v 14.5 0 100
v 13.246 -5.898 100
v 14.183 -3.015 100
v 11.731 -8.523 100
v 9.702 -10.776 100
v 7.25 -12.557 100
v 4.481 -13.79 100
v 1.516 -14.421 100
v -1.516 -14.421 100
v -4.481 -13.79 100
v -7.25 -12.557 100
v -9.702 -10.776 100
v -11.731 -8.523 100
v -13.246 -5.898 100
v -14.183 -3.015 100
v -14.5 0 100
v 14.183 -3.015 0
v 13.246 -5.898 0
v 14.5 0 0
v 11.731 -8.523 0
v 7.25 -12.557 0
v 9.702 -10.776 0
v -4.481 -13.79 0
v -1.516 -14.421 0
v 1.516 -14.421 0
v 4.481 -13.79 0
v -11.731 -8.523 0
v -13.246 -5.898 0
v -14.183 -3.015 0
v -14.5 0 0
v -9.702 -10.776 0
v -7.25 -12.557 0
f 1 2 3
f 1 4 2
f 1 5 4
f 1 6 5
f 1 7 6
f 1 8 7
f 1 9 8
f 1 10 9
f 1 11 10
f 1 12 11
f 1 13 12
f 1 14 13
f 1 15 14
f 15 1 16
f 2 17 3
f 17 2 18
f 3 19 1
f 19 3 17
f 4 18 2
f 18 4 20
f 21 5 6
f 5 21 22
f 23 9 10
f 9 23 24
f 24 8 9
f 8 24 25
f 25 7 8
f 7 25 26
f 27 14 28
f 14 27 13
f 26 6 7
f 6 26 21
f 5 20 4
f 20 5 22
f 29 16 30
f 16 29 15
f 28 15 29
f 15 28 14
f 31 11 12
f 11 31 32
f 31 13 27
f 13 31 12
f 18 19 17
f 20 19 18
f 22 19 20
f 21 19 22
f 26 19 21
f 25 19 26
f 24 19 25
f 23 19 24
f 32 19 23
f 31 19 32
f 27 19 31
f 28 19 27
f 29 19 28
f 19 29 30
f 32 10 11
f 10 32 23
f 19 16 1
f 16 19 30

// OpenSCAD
difference() {
  cylinder(r=14.5,h=100);
  translate([-15,0,-1]) cube([30,30,102]);
}
